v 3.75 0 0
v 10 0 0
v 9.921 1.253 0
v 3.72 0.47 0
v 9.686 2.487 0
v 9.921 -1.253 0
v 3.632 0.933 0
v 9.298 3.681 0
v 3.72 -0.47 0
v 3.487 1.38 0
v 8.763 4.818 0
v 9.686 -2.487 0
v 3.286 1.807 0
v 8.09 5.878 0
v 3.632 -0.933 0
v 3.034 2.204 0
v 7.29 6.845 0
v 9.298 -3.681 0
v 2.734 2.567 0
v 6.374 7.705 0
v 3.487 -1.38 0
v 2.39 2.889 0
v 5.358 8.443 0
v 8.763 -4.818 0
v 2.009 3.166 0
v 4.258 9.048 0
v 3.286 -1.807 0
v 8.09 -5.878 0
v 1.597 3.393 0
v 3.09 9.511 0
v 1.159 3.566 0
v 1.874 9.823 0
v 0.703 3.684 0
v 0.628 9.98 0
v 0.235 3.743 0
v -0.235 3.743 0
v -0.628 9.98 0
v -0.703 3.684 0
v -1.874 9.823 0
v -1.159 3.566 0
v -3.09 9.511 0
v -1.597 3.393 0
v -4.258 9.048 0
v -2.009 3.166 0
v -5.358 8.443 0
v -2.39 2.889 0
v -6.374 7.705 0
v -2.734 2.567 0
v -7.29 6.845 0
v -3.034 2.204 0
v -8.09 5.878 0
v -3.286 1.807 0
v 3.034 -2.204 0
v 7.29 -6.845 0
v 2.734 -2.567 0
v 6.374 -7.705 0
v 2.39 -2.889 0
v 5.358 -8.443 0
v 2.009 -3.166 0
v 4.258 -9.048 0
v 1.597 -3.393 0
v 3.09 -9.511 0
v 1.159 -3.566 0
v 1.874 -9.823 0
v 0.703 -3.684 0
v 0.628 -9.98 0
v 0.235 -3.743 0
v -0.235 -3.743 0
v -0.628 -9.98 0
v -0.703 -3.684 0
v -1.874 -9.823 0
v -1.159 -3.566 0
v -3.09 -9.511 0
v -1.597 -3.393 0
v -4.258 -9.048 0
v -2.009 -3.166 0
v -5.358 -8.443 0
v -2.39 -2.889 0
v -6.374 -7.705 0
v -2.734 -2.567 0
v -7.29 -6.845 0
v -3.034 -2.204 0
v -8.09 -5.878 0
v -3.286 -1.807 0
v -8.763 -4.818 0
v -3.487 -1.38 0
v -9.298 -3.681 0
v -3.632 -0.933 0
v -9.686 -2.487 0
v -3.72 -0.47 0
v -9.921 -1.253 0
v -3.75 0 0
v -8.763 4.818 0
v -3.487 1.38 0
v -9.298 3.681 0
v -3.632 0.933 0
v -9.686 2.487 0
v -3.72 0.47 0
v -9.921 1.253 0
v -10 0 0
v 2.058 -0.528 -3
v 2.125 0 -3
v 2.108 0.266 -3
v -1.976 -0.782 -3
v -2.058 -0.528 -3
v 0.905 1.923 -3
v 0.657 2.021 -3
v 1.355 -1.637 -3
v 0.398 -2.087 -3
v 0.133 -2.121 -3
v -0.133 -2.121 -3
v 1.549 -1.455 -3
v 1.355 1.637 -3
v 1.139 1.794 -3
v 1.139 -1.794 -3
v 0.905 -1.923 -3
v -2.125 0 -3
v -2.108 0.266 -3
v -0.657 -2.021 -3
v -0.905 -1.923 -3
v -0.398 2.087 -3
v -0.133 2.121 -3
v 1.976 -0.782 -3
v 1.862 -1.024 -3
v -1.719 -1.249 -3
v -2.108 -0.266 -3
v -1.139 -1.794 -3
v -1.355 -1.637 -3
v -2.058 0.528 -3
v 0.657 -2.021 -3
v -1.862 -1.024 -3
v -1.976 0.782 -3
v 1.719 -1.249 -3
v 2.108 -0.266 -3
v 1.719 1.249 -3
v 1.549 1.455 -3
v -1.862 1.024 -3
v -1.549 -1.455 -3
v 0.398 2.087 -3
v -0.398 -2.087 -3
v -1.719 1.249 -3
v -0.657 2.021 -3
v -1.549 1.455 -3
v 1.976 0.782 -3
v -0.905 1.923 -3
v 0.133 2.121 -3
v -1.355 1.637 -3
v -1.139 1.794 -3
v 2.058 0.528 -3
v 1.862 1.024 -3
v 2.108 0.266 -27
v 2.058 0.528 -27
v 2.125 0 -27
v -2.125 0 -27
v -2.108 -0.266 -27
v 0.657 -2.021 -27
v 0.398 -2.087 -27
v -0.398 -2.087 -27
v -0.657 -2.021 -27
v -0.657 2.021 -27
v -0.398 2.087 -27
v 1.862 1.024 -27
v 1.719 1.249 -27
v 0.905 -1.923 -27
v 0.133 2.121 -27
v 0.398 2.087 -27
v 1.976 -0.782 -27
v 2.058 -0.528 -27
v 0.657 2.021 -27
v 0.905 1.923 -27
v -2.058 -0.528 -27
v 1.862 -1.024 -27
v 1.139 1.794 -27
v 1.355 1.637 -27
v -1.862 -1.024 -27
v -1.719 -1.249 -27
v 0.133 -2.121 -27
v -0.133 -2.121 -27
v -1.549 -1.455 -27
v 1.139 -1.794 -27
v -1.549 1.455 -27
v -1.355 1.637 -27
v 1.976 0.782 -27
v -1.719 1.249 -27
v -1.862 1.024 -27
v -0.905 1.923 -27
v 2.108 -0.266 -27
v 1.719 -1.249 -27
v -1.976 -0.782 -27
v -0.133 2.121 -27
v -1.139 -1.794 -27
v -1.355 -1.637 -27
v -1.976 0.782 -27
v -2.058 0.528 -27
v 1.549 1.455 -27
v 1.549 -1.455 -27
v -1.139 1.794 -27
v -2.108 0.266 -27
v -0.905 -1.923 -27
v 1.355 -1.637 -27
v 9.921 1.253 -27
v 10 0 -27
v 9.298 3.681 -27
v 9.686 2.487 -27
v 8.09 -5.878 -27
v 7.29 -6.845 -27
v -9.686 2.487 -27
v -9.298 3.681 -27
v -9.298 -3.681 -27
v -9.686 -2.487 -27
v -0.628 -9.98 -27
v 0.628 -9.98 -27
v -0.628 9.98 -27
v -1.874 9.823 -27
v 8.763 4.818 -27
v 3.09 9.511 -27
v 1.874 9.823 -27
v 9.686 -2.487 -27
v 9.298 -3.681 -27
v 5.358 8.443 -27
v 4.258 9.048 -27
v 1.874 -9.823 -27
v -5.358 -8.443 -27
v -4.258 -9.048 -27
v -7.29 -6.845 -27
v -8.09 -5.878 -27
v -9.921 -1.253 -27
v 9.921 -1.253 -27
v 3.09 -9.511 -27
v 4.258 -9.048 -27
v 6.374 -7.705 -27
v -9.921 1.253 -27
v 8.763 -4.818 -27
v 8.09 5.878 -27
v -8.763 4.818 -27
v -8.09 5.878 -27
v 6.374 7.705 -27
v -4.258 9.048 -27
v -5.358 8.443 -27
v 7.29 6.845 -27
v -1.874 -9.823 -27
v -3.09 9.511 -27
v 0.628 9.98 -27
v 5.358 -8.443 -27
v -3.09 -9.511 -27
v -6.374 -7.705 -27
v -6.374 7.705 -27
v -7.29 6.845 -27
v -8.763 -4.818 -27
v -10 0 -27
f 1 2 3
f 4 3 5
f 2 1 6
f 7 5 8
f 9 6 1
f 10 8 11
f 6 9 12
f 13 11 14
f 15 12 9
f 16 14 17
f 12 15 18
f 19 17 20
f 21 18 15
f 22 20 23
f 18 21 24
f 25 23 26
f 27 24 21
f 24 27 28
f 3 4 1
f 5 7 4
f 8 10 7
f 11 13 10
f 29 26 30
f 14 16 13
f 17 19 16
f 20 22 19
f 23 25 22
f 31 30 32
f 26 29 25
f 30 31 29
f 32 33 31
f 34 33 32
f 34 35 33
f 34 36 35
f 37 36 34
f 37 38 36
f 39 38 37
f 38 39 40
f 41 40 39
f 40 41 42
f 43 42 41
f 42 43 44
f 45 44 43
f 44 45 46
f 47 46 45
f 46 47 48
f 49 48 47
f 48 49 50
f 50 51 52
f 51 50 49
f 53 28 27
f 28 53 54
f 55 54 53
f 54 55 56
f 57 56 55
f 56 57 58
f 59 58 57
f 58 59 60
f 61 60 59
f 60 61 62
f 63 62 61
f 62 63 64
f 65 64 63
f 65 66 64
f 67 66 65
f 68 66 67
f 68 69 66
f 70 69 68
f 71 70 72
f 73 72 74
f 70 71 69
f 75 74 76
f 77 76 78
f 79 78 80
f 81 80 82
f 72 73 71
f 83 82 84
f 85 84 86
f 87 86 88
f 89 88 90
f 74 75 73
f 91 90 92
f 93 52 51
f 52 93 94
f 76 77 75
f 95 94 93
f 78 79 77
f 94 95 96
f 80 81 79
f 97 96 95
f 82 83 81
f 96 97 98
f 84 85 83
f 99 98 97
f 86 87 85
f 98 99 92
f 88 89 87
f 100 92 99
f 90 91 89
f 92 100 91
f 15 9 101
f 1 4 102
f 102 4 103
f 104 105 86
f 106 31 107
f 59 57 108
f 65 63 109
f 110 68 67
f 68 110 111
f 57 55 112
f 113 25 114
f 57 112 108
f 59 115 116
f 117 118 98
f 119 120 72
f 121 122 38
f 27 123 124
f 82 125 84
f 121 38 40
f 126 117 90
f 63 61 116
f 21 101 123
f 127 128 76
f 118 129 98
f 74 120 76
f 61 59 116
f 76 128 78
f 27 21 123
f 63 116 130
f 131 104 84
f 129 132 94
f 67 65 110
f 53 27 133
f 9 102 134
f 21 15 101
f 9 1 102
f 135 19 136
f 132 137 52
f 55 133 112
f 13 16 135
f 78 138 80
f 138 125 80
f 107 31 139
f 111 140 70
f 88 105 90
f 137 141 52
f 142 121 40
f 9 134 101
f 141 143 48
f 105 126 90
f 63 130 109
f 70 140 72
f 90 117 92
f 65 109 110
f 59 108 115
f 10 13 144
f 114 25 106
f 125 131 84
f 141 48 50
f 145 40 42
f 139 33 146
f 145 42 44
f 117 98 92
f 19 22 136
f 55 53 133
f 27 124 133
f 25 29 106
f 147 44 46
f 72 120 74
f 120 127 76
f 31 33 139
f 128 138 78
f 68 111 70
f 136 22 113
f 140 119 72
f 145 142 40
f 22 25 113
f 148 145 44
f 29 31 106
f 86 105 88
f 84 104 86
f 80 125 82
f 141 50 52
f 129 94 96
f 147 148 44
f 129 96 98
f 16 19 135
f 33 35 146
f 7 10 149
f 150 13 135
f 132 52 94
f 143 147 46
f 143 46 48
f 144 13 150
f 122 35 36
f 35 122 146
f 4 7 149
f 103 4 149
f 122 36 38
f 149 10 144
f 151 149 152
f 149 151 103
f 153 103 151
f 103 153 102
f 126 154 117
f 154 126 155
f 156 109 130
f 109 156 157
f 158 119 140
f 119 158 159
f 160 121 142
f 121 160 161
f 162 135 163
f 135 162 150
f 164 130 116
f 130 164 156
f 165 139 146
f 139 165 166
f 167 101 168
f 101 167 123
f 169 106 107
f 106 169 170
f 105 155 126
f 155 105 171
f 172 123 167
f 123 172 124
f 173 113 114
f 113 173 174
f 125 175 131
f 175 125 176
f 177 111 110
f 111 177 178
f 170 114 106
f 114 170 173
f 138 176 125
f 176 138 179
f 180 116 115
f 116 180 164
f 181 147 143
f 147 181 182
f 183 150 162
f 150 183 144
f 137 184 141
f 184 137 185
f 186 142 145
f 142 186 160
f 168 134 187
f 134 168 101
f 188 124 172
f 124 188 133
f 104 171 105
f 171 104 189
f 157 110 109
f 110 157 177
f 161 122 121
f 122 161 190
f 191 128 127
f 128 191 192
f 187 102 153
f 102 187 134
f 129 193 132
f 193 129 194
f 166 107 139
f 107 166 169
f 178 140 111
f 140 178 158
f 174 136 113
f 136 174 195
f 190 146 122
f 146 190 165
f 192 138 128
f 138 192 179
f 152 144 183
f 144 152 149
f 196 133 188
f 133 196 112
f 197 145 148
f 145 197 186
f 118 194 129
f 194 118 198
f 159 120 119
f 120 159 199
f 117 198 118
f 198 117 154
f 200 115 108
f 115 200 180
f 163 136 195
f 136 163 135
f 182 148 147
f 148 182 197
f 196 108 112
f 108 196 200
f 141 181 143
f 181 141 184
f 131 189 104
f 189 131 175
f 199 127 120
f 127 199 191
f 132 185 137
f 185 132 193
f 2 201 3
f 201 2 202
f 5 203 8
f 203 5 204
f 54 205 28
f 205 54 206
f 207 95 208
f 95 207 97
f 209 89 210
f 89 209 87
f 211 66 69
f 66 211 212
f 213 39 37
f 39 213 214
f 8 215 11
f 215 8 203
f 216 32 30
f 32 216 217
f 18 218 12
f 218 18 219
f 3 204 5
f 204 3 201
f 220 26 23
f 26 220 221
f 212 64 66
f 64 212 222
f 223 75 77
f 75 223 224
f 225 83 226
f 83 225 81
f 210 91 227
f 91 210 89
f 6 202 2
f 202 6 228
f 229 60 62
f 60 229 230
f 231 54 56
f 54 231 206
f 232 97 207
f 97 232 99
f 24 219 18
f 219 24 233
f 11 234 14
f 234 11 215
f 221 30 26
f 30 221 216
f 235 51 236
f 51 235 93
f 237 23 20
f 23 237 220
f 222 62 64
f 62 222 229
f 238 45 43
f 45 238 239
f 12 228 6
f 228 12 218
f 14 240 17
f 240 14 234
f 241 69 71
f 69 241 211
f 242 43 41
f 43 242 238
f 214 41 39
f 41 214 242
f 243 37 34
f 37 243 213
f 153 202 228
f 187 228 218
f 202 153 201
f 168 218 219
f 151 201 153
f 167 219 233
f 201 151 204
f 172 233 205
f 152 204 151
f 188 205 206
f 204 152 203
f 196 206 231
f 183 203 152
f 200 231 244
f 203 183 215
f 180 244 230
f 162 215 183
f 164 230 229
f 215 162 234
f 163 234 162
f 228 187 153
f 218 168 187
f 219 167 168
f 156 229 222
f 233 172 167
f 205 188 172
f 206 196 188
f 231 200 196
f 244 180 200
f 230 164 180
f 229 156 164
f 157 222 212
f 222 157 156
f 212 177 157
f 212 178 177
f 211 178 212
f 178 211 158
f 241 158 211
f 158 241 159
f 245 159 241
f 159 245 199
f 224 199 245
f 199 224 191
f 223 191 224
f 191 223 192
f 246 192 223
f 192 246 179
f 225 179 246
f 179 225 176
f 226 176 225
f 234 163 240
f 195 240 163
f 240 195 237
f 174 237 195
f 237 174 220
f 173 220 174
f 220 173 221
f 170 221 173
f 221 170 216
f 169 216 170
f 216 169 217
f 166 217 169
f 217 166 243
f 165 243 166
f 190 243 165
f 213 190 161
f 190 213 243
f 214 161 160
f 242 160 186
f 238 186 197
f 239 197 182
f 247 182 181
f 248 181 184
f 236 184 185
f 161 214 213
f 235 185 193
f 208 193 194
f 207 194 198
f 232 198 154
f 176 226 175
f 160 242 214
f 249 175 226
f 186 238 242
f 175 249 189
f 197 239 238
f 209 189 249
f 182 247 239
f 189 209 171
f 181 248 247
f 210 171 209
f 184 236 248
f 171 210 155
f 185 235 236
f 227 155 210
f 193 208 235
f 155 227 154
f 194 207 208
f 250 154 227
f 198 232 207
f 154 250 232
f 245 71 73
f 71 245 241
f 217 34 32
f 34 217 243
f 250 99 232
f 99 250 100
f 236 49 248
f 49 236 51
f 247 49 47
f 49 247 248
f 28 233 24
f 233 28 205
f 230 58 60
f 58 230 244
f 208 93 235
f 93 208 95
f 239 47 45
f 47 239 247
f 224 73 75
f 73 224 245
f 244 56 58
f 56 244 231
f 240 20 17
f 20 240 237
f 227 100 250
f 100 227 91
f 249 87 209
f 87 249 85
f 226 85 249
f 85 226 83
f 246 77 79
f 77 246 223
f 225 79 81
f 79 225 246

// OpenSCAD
$fn = 50;


difference() {
	union() {
		translate(v = [0, 0, -27.0000000000]) {
			cylinder(h = 27, r = 10.0000000000);
		}
	}
	union() {
		translate(v = [0, 0, 0]) {
			rotate(a = [0, 0, 0]) {
				difference() {
					union() {
						translate(v = [0, 0, -30.0000000000]) {
							cylinder(h = 30, r = 2.0000000000);
						}
						translate(v = [0, 0, -3]) {
							cylinder(h = 3, r1 = 2.1250000000, r2 = 3.7500000000);
						}
						translate(v = [0, 0, -30.0000000000]) {
							cylinder(h = 30, r = 2.1250000000);
						}
						translate(v = [0, 0, -30.0000000000]) {
							cylinder(h = 30, r = 2.0000000000);
						}
					}
					union();
				}
			}
		}
	}
}
